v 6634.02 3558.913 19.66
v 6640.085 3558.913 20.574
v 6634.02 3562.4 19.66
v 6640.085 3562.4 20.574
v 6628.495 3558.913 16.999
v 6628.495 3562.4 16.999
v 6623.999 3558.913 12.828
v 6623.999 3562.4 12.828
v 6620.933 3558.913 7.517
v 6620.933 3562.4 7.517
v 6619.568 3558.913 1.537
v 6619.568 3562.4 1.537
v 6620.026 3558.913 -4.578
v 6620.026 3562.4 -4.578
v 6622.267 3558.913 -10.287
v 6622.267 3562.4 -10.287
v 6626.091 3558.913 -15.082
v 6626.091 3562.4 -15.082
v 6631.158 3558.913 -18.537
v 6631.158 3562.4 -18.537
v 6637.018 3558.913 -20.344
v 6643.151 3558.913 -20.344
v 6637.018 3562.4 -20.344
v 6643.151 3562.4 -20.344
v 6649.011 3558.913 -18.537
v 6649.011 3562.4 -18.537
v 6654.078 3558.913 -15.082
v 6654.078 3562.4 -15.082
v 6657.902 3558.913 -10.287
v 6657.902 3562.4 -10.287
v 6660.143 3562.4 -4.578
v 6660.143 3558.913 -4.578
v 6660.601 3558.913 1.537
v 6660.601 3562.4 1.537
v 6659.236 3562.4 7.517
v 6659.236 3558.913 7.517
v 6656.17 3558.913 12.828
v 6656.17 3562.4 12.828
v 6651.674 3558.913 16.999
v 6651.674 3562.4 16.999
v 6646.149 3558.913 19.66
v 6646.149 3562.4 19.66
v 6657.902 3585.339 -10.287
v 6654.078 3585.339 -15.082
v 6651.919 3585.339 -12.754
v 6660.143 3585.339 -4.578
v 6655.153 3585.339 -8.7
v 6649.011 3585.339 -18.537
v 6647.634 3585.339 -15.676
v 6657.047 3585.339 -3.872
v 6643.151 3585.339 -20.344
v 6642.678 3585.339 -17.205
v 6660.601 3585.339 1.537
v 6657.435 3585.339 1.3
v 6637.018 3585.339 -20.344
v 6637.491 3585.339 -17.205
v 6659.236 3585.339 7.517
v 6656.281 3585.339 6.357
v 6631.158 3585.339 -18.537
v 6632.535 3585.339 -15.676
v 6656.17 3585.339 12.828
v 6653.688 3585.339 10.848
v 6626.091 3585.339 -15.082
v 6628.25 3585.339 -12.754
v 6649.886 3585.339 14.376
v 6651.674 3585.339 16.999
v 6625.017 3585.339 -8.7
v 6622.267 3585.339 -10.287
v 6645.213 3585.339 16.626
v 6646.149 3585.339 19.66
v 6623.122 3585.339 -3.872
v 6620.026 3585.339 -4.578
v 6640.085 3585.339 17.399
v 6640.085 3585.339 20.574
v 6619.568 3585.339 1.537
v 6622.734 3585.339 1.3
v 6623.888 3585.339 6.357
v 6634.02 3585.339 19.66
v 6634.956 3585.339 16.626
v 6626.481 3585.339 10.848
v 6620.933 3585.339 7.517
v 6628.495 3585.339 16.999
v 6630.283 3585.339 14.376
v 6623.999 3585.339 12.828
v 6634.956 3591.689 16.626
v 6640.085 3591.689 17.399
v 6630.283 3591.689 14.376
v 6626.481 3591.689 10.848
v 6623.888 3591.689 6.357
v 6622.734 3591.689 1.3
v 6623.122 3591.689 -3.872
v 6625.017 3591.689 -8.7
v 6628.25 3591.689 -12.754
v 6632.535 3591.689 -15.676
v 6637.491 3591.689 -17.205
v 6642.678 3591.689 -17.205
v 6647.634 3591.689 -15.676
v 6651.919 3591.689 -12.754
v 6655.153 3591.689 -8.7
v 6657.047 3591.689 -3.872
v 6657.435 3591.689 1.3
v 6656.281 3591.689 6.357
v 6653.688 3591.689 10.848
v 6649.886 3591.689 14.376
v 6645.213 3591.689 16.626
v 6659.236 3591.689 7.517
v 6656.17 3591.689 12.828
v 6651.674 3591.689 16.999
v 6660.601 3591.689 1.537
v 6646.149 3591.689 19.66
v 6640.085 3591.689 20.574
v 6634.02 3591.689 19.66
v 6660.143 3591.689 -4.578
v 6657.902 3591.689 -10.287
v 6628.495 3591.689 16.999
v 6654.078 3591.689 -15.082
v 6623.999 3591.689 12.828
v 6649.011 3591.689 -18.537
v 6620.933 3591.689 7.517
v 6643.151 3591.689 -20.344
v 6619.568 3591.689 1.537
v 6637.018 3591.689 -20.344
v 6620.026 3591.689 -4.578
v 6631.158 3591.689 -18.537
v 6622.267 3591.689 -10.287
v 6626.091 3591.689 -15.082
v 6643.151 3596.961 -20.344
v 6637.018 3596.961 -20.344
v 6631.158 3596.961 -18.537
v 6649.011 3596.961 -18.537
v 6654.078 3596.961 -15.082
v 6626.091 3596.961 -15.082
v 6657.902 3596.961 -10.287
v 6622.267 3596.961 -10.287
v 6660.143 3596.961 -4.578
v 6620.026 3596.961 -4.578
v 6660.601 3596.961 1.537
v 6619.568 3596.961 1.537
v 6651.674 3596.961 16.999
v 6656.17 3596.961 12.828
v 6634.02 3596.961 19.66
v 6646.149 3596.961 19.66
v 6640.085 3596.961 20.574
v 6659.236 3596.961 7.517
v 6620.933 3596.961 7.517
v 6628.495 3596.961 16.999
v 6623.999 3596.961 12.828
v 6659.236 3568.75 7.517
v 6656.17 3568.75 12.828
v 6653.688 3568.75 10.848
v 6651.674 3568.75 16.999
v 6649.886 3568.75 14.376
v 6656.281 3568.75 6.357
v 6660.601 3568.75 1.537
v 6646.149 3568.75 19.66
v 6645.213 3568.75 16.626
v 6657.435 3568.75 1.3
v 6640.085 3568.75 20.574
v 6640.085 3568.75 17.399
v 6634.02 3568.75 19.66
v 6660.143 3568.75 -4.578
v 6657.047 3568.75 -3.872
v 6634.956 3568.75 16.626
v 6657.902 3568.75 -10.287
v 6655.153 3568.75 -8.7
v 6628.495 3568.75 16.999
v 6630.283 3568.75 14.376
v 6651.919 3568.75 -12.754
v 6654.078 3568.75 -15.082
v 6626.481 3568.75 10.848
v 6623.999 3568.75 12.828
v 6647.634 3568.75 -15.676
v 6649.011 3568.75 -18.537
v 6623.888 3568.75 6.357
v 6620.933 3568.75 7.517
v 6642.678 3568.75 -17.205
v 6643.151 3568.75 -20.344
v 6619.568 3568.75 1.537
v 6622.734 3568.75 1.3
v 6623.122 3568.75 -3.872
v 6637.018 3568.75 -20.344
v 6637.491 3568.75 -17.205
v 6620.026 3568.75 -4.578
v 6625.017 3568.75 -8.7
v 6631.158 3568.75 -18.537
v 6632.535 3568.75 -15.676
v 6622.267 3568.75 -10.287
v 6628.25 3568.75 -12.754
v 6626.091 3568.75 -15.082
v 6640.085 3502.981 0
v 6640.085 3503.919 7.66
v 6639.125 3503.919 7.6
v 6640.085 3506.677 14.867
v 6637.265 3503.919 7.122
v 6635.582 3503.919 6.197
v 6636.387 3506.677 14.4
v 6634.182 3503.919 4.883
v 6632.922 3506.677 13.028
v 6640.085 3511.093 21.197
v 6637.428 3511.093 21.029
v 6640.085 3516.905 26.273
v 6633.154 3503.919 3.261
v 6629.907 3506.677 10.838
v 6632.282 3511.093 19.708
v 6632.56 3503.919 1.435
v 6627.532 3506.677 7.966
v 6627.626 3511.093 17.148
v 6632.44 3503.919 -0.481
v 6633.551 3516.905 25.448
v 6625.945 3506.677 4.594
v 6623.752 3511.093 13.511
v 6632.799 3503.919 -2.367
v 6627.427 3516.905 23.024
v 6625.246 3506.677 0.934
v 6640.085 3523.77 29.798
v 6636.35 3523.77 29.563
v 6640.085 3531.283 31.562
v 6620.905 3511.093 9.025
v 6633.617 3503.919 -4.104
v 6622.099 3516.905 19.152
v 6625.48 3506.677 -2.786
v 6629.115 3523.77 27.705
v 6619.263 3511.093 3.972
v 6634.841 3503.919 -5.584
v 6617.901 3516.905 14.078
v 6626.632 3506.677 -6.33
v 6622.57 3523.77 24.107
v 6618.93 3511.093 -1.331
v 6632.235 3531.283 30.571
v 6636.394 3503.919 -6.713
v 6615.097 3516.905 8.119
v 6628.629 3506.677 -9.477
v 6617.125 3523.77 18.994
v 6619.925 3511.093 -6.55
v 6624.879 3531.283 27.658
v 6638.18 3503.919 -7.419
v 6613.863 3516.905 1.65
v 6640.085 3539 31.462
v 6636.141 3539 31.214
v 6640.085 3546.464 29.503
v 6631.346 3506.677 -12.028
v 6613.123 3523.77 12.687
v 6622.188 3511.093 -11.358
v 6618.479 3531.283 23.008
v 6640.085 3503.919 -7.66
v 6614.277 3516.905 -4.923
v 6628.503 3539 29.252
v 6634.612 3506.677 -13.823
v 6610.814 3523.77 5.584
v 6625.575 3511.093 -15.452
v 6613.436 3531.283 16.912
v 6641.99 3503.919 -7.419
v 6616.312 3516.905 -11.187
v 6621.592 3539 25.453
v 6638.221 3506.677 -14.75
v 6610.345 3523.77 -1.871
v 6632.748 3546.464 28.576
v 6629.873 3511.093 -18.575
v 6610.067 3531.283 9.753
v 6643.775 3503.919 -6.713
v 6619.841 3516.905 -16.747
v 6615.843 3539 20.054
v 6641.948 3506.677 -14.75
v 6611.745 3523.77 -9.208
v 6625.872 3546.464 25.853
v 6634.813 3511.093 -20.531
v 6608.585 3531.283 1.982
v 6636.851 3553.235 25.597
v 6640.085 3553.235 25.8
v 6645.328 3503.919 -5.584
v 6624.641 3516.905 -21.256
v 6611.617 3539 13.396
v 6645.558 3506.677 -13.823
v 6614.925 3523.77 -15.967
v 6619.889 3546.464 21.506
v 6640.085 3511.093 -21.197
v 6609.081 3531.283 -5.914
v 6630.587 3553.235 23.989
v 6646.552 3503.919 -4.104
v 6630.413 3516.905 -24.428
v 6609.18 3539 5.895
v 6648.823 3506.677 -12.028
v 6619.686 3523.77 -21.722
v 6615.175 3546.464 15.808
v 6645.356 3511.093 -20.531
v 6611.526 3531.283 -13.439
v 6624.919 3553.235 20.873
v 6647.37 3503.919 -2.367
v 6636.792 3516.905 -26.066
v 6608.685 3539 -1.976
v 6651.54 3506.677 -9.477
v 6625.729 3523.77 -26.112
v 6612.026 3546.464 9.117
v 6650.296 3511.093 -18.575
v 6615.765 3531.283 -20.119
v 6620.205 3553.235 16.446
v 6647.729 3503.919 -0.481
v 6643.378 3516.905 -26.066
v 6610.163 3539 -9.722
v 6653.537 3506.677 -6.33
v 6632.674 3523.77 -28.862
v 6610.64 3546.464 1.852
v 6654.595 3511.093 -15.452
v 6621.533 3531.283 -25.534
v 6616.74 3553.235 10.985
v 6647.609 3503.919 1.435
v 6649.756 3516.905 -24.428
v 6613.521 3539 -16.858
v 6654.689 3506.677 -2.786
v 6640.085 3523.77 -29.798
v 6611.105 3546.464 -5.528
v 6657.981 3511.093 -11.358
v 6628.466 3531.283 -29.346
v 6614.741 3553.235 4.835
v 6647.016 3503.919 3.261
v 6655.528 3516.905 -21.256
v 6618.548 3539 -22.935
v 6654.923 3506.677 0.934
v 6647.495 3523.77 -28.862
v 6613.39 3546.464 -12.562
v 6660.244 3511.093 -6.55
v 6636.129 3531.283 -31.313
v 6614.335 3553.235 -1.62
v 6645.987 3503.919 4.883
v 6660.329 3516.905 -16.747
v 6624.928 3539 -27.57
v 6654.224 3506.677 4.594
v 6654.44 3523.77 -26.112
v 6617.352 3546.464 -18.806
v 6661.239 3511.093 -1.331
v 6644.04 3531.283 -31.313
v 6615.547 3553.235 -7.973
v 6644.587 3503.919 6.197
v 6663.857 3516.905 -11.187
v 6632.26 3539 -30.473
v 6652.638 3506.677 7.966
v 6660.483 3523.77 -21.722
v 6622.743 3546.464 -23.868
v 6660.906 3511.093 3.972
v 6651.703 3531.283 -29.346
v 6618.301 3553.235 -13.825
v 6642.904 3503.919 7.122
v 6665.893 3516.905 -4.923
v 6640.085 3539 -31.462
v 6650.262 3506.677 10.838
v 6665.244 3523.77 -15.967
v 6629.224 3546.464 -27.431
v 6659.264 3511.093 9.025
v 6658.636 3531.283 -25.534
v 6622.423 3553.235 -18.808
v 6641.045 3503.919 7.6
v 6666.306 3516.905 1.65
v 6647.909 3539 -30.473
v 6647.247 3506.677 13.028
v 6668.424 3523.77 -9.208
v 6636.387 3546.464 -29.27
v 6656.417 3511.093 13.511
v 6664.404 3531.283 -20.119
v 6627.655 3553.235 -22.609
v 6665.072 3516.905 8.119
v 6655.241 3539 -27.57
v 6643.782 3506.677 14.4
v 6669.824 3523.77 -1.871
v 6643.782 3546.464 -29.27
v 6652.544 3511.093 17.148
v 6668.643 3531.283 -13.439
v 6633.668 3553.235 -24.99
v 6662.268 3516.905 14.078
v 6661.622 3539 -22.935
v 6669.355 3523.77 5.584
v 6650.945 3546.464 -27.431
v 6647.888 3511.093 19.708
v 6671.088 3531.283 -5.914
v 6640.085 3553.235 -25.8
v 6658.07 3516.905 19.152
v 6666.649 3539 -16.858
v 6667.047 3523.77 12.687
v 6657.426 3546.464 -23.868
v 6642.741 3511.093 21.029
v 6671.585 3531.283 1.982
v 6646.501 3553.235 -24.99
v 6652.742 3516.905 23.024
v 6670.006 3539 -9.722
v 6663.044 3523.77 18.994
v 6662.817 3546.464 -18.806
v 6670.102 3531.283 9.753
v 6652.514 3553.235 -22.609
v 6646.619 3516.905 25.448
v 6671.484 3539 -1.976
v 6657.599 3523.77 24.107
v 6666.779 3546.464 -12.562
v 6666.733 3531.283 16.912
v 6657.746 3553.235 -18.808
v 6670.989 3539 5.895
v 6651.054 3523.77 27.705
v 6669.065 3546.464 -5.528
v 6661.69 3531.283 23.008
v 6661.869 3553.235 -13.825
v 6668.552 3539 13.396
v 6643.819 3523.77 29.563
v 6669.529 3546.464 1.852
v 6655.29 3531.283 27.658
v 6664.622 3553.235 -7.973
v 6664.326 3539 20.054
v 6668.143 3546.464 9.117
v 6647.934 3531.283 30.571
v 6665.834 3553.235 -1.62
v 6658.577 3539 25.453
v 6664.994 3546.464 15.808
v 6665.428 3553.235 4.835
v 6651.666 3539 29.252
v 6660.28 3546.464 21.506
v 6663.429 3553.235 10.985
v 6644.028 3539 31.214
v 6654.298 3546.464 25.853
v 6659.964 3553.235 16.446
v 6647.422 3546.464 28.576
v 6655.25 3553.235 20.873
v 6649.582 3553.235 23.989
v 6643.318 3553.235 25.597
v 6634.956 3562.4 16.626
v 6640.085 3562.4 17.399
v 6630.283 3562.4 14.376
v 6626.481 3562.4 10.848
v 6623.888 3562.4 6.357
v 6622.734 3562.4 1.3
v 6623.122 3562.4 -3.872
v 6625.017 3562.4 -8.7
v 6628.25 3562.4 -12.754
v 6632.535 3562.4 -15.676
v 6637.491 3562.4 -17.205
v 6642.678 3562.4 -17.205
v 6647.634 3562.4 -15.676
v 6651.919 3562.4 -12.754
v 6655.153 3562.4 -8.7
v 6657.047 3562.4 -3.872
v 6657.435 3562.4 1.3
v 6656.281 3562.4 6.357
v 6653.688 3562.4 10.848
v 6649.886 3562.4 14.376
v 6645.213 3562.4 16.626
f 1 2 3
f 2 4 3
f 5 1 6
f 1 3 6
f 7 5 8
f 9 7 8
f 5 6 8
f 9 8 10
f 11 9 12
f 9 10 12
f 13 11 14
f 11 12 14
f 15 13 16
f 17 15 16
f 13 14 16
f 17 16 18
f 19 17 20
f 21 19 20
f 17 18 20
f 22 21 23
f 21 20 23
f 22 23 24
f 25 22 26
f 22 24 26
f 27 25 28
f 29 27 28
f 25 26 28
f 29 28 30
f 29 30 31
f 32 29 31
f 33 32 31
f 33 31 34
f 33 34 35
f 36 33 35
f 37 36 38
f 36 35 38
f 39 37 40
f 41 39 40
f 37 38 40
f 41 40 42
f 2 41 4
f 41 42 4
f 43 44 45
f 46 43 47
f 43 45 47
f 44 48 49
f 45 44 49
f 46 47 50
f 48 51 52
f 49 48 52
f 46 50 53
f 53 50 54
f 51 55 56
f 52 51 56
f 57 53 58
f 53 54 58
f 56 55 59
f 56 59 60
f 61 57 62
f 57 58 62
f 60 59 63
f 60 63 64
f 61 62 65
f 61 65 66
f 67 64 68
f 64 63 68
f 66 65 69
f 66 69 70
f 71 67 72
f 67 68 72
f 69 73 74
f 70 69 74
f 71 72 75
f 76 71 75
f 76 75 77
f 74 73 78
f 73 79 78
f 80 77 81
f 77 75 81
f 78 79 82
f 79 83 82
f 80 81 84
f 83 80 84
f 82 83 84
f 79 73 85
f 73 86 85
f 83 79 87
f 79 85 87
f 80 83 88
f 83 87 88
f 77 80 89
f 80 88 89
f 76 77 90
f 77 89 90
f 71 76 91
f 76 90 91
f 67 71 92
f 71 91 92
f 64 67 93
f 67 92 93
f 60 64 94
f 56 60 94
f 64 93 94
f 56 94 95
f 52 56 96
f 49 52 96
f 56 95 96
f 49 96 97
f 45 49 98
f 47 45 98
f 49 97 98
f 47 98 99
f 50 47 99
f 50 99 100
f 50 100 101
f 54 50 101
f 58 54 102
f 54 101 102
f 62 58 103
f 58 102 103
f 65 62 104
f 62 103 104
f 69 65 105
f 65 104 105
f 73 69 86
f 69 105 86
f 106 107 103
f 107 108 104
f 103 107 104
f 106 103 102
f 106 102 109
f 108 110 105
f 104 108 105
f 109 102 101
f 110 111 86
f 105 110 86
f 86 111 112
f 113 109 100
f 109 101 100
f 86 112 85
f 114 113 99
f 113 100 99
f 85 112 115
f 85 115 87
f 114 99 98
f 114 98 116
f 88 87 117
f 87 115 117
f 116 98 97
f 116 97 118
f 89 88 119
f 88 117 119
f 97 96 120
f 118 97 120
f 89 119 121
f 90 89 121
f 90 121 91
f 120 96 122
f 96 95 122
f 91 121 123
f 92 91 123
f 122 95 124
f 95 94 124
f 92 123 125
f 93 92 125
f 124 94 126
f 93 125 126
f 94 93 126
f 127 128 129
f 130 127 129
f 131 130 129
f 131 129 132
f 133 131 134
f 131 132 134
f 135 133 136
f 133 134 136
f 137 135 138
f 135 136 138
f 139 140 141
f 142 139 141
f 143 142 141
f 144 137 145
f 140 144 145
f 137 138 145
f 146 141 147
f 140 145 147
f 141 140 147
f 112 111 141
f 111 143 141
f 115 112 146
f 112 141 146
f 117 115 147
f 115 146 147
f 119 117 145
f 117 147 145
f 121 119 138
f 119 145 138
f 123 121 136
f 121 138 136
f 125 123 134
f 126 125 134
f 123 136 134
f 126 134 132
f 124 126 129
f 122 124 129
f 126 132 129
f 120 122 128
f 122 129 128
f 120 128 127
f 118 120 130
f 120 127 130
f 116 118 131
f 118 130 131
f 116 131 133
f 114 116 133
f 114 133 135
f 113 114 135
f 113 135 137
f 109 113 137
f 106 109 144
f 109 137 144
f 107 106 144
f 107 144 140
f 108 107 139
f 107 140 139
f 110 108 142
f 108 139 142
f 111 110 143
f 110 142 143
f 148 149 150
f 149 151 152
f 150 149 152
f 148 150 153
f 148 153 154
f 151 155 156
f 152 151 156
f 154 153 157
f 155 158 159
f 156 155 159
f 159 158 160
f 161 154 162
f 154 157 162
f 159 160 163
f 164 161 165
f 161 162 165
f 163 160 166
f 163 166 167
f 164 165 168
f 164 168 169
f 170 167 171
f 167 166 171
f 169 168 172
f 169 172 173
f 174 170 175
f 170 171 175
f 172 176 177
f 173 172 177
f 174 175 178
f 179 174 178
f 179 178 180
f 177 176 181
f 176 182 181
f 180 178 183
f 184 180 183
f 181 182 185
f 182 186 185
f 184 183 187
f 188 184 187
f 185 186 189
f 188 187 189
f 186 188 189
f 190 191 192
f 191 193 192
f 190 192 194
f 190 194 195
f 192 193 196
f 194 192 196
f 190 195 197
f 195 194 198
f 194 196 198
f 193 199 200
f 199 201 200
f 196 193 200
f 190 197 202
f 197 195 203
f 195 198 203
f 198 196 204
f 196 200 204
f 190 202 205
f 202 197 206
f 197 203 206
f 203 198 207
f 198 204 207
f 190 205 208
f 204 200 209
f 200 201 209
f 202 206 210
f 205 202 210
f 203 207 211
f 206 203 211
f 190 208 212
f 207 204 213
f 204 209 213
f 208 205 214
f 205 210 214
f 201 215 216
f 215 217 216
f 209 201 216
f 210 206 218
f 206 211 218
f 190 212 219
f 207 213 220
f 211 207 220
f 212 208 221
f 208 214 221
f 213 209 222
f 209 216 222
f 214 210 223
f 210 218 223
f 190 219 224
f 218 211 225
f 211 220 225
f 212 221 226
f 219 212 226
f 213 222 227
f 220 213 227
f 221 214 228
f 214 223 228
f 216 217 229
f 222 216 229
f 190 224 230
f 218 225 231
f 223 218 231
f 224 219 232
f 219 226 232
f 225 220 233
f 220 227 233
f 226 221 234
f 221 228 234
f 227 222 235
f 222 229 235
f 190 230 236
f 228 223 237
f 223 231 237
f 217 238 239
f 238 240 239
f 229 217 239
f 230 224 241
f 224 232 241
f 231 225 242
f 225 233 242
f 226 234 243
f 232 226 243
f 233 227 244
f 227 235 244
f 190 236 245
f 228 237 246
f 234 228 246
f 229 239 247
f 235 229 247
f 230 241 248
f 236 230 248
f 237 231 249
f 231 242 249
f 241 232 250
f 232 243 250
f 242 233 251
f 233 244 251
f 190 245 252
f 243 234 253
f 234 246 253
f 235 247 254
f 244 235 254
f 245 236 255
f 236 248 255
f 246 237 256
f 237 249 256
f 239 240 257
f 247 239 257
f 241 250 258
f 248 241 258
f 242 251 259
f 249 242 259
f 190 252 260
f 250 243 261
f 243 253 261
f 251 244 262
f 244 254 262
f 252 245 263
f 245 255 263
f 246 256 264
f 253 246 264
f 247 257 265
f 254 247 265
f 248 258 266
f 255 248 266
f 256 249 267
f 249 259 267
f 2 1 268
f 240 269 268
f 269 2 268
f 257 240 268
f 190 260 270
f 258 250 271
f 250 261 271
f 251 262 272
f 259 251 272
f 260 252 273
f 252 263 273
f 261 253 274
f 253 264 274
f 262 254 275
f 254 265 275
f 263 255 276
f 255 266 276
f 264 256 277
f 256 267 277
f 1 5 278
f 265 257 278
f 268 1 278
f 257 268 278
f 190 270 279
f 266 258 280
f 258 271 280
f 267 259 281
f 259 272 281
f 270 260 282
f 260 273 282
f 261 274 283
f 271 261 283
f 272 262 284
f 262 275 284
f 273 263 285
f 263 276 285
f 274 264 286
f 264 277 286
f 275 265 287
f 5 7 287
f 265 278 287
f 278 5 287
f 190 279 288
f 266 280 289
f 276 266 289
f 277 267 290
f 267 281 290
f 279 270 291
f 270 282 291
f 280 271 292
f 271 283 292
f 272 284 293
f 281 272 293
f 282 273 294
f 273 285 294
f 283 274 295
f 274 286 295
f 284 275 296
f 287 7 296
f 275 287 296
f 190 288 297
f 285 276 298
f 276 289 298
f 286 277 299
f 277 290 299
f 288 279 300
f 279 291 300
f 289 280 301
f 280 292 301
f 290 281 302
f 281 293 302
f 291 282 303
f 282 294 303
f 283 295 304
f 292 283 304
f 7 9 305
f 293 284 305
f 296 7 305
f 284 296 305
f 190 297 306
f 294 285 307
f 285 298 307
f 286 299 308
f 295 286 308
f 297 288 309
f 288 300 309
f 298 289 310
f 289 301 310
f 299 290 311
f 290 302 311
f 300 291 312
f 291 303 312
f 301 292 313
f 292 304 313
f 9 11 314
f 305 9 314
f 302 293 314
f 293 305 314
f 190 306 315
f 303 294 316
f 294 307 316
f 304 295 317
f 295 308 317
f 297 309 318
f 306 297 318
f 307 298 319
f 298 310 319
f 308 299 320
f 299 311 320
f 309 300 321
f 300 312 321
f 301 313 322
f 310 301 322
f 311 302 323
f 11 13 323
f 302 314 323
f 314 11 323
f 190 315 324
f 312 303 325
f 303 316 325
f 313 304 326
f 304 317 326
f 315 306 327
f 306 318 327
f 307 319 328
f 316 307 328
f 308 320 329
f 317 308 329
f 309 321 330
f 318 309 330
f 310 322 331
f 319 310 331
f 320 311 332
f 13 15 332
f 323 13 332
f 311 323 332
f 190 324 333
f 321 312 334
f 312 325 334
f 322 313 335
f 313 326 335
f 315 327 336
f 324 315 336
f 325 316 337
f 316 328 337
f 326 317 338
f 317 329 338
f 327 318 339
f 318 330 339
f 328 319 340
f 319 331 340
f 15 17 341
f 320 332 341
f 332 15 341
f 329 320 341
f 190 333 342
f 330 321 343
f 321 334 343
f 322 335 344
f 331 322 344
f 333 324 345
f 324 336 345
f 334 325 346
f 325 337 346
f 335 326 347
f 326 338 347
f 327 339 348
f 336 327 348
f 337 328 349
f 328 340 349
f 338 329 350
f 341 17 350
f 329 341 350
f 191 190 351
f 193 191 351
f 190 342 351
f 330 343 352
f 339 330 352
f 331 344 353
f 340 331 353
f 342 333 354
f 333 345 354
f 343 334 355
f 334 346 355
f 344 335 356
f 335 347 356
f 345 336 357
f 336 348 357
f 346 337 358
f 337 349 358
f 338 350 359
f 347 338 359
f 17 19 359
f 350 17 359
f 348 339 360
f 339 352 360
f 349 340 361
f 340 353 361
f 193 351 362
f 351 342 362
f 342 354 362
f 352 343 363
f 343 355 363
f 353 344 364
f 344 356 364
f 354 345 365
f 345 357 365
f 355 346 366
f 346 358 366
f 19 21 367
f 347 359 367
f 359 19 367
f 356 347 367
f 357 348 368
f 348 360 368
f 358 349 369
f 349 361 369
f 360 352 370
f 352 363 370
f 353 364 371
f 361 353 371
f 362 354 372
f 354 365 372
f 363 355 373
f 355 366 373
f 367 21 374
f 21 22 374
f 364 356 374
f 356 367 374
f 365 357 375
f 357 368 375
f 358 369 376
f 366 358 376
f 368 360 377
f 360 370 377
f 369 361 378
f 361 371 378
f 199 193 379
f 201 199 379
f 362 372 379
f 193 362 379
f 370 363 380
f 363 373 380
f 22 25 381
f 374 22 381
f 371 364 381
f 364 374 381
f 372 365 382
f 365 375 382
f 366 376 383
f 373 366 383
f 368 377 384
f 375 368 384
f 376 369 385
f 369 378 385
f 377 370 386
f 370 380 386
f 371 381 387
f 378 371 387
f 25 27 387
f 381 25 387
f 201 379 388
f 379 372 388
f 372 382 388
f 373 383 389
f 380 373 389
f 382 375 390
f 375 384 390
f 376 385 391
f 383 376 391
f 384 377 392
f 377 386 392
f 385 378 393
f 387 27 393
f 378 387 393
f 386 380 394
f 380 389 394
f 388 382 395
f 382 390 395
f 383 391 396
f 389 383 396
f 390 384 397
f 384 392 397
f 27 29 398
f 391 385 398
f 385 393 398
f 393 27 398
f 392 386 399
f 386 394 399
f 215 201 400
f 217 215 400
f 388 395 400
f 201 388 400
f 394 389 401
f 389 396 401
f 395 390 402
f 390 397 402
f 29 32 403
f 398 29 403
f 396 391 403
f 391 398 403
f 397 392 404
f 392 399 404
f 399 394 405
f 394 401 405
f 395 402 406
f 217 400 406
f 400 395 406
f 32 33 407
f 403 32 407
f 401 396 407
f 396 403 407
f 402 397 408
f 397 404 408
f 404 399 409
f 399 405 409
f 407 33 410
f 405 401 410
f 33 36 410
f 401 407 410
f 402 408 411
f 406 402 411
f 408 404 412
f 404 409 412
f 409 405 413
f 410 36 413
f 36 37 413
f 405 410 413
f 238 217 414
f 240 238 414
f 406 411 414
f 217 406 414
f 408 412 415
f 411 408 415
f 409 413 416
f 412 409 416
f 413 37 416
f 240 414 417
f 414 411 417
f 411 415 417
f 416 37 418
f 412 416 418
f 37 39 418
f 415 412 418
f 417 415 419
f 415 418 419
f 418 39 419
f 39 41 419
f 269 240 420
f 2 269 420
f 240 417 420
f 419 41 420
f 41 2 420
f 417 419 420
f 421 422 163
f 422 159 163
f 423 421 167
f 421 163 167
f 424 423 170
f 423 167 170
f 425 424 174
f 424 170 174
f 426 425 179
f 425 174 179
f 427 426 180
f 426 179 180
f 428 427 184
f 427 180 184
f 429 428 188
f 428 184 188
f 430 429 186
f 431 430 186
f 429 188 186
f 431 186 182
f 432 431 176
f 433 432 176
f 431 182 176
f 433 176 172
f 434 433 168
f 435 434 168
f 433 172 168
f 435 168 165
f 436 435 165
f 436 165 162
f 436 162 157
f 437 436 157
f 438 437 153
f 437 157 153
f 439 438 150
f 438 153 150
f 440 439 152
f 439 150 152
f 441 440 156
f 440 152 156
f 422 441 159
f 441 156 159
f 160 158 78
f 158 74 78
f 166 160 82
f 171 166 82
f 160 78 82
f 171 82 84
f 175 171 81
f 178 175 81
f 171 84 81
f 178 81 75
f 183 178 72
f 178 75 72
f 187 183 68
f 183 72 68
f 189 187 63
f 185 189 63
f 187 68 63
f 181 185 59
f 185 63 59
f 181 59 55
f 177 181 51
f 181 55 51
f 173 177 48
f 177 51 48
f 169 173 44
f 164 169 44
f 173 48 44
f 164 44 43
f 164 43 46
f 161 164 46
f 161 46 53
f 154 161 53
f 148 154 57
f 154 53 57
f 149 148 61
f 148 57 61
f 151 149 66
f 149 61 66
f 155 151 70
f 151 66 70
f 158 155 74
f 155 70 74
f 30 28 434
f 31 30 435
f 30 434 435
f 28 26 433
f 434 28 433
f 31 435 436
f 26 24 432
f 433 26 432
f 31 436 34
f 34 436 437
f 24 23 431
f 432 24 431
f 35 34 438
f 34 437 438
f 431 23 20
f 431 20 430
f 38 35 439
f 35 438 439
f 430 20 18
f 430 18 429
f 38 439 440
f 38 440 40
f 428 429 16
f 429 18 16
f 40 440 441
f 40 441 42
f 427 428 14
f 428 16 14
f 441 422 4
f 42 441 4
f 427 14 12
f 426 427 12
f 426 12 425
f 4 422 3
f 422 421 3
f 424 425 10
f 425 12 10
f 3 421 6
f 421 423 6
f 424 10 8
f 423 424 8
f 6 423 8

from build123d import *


with BuildPart() as part:
    # Sketch1 → Revolve1 (revolve)
    with BuildSketch(Plane.XY, mode=Mode.PRIVATE) as revolve1_sk:
        with BuildLine():
            Line((6640.084580843, 3596.961198709), (6640.084580843, 3502.981198709))
            ThreePointArc((6640.084580843, 3502.981198709), (6610.286564464, 3523.770326487), (6619.510580843, 3558.913279348))
            Line((6619.510580843, 3558.913279348), (6619.510580843, 3562.400142715))
            Line((6619.510580843, 3562.400142715), (6622.685580843, 3562.400142715))
            Line((6622.685580843, 3562.400142715), (6622.685580843, 3568.750142715))
            Line((6622.685580843, 3568.750142715), (6619.510580843, 3568.750142715))
            Line((6619.510580843, 3568.750142715), (6619.510580843, 3585.338770448))
            Line((6619.510580843, 3585.338770448), (6622.685580843, 3585.338770448))
            Line((6622.685580843, 3585.338770448), (6622.685580843, 3591.688770448))
            Line((6622.685580843, 3591.688770448), (6619.510580843, 3591.688770448))
            Line((6619.510580843, 3591.688770448), (6619.510580843, 3596.961198709))
            Line((6619.510580843, 3596.961198709), (6640.084580843, 3596.961198709))
        make_face()
    revolve(revolve1_sk.sketch.rotate(Axis((6640.084580843, 3596.961198709, 0), (0, -1, 0)), 270), axis=Axis((6640.084580843, 3596.961198709, 0), (0, -1, 0)))


solid = part.part
